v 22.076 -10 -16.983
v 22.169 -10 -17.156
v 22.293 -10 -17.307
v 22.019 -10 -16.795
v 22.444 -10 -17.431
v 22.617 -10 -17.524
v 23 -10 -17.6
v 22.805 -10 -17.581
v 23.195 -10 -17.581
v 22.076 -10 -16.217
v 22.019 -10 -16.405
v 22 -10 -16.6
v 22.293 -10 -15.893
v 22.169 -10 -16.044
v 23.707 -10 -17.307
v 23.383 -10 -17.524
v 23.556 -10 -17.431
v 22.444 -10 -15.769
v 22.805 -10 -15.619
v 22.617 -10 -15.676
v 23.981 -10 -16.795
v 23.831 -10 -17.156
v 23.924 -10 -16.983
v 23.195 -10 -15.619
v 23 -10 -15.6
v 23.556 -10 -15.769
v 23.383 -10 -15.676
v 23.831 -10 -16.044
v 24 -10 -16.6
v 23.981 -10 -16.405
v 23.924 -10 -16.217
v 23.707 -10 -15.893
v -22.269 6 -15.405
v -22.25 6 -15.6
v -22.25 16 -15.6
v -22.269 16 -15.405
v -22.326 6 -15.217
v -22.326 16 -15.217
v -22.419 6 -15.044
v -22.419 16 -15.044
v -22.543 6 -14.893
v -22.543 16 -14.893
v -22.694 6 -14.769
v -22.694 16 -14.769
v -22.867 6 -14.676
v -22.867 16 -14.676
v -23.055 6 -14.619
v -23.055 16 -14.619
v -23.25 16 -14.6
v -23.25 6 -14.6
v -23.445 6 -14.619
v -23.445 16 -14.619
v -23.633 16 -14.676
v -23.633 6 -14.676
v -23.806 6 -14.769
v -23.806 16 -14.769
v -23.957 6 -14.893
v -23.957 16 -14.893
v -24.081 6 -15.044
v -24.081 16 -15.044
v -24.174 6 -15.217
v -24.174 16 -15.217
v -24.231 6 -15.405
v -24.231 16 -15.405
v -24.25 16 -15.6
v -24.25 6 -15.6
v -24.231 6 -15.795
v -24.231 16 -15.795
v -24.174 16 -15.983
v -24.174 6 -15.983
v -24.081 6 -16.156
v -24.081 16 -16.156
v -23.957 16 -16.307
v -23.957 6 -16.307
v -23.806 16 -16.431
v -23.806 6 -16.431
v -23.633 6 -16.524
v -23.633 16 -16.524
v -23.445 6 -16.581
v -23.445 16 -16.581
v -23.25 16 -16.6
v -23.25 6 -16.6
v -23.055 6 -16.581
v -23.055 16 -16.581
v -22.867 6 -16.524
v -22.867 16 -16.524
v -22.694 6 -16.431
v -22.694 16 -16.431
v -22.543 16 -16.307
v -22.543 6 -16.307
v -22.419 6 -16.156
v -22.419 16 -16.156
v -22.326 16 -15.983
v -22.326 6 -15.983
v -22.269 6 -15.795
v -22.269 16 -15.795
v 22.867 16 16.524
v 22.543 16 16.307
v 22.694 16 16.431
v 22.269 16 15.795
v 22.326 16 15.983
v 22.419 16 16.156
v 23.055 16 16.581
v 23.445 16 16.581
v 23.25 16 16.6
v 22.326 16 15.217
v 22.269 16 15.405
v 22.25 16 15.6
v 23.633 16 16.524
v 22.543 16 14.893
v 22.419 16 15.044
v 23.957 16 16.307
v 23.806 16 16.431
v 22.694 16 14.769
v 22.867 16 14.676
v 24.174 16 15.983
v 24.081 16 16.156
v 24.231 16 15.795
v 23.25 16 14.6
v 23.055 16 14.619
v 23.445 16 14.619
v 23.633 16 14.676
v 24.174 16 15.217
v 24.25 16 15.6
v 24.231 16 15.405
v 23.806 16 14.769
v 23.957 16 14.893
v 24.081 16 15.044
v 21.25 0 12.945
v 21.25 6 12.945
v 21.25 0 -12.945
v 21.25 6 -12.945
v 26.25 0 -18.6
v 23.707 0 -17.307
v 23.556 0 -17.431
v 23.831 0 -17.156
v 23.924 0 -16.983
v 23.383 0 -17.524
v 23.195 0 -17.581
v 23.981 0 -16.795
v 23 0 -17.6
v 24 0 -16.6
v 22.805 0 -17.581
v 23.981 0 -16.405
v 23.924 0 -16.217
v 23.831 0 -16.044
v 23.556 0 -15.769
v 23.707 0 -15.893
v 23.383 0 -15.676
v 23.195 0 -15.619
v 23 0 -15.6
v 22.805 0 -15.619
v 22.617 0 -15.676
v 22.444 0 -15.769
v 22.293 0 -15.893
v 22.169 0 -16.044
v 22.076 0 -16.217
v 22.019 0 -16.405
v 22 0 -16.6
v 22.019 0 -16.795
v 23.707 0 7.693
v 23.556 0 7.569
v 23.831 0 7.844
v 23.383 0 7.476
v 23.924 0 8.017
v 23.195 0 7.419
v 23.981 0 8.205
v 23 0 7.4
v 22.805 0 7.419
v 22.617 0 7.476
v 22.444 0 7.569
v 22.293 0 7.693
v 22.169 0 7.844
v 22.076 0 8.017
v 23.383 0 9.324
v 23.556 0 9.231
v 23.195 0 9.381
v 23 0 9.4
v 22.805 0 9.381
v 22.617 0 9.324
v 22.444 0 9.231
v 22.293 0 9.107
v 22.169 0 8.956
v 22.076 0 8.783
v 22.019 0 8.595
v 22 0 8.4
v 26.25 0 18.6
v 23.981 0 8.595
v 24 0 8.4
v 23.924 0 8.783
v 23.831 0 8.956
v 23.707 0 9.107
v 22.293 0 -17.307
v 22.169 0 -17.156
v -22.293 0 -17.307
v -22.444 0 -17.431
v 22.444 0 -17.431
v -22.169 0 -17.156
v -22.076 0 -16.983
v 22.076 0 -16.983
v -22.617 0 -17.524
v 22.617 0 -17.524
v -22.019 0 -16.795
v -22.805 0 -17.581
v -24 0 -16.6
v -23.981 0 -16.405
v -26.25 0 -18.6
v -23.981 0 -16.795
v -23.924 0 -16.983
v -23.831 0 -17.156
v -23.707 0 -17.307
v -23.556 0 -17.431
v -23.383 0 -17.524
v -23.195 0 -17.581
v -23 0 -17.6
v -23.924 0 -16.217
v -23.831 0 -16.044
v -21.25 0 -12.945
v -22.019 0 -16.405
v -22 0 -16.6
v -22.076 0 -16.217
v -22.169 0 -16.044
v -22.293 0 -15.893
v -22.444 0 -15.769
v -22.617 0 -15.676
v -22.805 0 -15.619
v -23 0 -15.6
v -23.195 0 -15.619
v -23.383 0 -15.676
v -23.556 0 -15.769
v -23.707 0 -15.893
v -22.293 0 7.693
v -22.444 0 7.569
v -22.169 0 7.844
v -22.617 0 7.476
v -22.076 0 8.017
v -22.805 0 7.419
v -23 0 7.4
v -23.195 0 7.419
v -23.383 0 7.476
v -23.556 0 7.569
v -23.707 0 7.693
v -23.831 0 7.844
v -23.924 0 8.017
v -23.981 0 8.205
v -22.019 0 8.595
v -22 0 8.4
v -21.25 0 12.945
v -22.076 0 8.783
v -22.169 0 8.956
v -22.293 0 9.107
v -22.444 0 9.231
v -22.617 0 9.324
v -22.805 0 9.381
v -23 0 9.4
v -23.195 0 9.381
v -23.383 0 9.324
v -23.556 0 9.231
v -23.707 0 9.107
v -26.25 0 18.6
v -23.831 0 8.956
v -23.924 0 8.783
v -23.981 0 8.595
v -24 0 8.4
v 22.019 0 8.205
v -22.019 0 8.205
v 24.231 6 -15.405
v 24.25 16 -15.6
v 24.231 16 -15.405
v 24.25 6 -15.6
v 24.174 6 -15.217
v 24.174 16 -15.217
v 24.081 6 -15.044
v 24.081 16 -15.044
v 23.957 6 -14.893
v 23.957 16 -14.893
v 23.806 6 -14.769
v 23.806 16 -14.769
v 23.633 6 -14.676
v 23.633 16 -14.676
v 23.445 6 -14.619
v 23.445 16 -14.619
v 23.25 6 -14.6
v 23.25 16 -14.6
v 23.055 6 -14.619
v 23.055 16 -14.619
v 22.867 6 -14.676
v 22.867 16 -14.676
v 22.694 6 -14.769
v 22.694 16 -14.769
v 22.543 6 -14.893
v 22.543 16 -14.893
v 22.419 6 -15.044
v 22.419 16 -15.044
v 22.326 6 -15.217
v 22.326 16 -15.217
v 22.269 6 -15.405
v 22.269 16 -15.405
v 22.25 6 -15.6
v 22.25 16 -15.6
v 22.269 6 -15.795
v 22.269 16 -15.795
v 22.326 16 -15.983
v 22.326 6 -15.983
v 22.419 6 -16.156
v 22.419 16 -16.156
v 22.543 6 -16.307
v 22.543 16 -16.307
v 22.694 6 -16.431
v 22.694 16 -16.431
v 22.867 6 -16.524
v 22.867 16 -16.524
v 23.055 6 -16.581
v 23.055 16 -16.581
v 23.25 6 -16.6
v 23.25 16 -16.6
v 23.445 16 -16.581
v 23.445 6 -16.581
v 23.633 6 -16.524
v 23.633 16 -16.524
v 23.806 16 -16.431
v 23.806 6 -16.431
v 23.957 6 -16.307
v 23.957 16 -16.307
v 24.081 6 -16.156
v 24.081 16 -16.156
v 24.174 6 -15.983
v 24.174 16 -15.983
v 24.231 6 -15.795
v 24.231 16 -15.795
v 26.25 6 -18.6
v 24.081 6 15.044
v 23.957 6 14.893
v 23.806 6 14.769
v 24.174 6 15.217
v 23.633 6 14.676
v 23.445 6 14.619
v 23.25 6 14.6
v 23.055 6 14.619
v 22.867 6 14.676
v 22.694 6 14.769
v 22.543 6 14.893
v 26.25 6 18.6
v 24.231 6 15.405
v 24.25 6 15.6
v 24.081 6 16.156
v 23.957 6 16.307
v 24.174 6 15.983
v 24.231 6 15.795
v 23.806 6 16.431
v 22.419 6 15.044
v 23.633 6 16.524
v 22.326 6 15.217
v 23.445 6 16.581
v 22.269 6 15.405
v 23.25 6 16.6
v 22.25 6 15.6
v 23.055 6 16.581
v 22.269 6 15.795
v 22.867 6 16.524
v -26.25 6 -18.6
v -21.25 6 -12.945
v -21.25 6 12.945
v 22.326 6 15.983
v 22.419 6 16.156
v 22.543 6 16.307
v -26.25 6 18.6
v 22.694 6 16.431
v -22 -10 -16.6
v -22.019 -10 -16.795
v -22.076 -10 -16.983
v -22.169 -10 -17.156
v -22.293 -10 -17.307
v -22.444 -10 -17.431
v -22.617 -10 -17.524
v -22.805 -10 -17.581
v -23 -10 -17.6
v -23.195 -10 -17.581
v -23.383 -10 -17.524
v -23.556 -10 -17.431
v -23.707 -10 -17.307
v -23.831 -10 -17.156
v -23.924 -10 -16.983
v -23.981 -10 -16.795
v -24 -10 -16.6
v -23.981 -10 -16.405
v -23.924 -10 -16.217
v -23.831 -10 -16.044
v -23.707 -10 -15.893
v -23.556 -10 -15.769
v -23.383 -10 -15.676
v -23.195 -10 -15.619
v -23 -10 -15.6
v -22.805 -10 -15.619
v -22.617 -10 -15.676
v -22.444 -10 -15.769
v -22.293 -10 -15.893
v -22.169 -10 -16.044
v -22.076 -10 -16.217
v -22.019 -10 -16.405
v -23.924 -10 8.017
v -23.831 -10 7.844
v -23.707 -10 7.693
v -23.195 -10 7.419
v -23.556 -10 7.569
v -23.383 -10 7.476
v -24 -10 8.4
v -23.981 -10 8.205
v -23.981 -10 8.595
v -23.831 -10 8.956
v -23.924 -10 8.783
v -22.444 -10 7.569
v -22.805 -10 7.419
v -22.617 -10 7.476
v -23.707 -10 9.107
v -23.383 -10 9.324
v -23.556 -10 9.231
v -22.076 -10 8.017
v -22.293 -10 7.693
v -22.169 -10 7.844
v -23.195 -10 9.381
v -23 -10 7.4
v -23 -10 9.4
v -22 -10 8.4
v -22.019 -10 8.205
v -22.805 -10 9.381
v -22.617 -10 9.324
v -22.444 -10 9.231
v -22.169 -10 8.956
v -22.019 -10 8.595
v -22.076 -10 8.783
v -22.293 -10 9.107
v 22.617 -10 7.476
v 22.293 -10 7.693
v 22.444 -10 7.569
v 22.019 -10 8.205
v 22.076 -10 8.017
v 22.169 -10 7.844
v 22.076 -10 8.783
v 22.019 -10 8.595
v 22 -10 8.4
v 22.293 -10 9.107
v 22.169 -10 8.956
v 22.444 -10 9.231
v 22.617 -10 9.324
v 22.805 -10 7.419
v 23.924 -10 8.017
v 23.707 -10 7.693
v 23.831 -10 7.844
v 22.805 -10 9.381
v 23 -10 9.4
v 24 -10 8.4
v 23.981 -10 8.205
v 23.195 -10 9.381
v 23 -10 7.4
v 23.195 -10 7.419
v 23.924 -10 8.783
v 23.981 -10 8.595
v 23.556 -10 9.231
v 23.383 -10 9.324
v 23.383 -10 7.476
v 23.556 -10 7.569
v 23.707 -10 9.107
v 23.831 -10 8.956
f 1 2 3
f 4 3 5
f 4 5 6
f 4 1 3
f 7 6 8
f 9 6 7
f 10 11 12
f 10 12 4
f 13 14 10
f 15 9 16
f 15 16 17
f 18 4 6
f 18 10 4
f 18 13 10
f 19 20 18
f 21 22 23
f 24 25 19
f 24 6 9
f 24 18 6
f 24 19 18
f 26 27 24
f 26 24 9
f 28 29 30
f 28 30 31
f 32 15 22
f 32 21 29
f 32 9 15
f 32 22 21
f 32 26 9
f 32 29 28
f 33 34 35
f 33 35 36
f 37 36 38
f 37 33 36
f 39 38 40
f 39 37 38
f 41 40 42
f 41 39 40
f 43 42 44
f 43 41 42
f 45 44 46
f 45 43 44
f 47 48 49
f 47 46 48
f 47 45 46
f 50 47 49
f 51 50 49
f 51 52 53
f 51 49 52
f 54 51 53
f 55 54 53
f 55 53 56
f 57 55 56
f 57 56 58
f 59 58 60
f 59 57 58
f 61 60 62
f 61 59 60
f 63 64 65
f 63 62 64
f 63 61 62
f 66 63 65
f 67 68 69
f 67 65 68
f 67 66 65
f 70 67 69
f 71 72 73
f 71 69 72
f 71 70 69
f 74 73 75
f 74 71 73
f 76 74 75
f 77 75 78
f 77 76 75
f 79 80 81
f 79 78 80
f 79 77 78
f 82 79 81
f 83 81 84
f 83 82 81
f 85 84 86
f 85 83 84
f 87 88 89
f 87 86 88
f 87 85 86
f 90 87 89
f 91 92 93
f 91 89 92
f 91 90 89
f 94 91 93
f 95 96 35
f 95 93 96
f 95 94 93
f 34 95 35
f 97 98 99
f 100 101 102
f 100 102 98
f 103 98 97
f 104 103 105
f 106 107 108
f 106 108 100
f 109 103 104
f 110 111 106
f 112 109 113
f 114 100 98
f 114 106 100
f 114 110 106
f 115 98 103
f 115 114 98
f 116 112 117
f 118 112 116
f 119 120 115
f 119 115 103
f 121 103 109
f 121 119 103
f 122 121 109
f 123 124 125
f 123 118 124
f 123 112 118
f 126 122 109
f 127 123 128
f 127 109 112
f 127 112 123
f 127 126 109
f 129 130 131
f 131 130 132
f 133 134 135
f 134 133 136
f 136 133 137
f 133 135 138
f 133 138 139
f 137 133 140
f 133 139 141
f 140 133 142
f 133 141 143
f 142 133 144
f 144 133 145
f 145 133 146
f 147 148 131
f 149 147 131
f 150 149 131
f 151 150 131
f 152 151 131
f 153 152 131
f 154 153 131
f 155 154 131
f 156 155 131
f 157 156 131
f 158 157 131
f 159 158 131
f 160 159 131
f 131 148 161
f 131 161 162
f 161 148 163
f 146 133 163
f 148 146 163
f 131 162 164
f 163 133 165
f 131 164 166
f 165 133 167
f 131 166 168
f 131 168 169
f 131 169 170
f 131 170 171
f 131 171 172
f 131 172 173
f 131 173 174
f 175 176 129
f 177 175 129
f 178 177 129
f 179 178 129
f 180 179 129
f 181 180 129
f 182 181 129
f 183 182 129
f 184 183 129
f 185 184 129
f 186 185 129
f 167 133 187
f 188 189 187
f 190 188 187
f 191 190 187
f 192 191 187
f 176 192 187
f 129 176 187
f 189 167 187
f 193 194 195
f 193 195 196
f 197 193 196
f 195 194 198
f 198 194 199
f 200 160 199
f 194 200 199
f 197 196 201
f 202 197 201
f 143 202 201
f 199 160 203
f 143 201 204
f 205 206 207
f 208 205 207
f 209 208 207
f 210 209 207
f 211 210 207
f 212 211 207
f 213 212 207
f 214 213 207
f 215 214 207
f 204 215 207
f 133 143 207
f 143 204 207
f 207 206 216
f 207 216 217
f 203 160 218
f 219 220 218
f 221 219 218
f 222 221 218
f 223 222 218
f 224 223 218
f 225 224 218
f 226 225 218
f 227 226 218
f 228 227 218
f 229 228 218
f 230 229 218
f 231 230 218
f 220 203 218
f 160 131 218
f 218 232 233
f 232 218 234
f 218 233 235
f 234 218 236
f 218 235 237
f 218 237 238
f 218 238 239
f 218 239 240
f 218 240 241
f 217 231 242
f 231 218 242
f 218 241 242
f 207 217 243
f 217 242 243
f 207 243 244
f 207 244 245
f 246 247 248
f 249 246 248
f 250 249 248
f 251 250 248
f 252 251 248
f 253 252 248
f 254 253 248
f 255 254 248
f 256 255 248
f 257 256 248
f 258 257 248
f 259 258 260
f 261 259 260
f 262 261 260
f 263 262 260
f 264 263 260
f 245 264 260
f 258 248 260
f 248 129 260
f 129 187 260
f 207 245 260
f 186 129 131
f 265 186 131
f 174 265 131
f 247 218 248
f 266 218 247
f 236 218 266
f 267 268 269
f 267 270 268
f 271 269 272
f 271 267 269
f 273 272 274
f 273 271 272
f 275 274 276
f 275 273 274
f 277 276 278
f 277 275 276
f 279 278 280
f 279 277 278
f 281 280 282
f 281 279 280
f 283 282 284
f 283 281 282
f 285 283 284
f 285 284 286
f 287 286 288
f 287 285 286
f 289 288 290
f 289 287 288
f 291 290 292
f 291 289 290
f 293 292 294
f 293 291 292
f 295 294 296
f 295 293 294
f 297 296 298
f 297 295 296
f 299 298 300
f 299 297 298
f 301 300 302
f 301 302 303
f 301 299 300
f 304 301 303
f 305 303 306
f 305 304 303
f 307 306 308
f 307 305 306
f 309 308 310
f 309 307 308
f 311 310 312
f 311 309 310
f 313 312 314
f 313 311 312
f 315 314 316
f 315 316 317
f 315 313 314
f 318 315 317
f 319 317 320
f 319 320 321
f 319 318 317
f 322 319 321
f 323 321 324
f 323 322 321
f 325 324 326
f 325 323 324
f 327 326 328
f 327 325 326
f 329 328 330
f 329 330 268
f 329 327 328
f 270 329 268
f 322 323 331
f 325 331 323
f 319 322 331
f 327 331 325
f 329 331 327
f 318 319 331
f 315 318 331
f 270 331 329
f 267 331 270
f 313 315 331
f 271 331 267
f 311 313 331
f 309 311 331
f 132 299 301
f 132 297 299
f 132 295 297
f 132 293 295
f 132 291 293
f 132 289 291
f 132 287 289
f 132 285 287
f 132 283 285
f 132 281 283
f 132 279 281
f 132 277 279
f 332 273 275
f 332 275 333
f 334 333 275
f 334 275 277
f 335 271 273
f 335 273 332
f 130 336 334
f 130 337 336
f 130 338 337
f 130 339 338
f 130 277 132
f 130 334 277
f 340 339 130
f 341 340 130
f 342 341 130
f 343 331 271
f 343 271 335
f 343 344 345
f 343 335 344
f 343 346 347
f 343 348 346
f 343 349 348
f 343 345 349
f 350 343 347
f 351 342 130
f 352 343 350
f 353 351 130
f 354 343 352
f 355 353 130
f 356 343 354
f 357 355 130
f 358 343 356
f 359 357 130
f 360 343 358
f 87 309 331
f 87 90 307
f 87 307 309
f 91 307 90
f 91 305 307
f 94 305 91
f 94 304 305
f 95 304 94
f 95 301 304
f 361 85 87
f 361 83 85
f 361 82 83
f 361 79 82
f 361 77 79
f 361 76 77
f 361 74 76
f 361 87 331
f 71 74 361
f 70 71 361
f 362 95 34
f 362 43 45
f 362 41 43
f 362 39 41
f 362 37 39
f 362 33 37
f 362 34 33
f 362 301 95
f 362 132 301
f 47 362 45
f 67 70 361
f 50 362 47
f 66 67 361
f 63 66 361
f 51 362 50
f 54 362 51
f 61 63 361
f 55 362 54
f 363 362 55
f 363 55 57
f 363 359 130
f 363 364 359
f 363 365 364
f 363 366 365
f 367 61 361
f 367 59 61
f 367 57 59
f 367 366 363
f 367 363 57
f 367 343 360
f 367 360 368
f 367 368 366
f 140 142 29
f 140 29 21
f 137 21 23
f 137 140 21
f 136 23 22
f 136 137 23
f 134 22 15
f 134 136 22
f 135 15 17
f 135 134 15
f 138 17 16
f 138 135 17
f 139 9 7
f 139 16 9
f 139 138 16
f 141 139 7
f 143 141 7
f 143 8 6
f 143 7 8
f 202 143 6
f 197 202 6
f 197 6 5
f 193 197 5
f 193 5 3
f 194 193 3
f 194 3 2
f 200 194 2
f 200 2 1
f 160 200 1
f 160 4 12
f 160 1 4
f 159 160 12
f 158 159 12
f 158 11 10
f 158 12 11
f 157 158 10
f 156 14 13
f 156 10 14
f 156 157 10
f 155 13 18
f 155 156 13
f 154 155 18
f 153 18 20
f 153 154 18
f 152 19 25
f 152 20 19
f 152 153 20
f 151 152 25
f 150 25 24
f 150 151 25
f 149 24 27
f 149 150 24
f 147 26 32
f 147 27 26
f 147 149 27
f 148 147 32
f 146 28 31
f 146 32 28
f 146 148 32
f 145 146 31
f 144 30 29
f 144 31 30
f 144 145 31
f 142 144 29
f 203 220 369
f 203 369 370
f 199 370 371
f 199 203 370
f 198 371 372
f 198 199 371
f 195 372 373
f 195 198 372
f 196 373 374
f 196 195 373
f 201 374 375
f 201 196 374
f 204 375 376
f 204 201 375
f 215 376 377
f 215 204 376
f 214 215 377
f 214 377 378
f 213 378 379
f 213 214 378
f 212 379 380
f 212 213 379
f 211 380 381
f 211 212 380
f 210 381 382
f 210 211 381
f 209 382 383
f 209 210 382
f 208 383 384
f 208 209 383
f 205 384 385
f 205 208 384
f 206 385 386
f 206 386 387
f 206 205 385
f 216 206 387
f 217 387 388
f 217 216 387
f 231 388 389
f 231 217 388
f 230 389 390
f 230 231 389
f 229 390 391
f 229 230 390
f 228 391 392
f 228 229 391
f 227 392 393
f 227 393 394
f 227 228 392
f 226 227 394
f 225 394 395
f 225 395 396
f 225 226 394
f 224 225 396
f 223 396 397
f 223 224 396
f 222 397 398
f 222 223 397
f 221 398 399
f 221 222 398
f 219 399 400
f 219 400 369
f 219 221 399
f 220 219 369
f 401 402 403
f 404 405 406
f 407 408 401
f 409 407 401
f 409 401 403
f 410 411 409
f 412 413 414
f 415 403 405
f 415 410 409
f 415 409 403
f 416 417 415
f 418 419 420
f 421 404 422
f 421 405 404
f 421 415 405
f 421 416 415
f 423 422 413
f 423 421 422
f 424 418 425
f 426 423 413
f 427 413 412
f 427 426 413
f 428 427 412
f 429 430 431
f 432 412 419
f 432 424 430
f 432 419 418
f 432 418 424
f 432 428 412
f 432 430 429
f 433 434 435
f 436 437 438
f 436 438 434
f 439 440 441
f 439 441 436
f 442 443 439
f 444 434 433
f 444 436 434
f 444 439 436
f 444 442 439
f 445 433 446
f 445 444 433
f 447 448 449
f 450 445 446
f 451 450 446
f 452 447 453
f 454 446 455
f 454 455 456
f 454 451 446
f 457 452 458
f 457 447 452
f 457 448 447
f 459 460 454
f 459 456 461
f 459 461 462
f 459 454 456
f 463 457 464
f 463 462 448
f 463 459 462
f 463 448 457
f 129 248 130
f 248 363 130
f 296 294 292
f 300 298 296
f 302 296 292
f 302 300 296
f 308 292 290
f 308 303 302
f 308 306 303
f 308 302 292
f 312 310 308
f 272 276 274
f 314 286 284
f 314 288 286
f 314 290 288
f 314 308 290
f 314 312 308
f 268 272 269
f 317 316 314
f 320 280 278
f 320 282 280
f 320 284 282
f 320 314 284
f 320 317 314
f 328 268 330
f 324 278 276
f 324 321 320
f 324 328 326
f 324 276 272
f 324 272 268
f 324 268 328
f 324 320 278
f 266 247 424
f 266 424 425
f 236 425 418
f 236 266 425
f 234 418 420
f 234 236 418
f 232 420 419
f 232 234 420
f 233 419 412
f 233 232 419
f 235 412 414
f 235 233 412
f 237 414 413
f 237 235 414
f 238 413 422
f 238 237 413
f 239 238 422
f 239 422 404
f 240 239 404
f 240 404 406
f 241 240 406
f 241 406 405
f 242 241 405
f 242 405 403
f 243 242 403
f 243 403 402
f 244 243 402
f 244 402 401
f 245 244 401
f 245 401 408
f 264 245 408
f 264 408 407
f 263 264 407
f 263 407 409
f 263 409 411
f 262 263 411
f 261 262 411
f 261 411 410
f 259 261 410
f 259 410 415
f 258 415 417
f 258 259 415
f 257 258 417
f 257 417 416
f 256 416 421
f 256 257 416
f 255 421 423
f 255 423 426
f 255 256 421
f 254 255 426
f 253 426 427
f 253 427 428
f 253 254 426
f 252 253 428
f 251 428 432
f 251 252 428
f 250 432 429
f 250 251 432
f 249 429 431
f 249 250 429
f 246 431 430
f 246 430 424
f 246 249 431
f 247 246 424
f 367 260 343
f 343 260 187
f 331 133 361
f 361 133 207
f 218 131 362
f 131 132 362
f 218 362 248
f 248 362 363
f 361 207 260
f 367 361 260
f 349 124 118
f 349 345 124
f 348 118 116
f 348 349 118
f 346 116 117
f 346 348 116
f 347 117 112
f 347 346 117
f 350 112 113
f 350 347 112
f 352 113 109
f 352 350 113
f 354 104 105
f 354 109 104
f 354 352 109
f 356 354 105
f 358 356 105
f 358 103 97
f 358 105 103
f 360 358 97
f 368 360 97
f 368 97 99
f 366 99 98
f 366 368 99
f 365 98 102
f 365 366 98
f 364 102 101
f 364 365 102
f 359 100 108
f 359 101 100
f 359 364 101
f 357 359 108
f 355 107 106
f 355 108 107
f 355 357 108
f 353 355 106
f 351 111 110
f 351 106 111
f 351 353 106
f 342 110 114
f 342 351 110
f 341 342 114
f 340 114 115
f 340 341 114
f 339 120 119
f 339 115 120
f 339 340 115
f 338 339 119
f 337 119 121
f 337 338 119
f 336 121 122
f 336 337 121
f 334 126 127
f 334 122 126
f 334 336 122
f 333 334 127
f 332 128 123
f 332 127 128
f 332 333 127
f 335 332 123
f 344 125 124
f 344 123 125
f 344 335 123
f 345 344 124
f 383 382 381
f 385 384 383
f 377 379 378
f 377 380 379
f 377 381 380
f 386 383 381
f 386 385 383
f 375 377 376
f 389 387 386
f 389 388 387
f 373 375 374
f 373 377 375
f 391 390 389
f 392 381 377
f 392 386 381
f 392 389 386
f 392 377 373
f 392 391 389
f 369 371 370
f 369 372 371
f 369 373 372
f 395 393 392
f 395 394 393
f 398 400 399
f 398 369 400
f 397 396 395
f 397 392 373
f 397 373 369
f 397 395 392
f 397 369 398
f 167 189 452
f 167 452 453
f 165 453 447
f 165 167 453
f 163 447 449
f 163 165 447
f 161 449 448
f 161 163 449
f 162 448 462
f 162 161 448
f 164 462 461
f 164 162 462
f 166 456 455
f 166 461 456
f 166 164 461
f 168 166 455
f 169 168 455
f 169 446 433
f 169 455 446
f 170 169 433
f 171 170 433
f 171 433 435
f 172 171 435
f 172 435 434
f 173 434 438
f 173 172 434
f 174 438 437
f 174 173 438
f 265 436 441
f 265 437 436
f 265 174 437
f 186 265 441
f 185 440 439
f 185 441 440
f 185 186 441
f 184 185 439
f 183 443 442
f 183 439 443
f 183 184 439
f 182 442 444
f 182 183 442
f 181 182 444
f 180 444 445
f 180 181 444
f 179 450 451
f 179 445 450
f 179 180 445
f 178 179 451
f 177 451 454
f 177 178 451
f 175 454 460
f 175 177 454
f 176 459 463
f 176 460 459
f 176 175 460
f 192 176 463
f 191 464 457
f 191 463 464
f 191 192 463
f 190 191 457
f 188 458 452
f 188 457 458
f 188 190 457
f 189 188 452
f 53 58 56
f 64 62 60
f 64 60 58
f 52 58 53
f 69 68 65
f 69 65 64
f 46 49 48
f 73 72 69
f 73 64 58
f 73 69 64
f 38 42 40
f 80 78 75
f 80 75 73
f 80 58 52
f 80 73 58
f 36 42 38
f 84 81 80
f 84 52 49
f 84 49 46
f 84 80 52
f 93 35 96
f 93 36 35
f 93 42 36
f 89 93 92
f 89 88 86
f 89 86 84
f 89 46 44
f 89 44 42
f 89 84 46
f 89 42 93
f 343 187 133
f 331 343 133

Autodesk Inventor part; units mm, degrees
ref_plane "YZ Plane" through (0, 0, 0) normal (1, 0, 0) x (0, 1, 0)
ref_plane "XZ Plane" through (0, 0, 0) normal (0, 1, 0) x (-1, 0, 0)
ref_plane "XY Plane" through (0, 0, 0) normal (0, 0, 1) x (1, 0, 0)
sketch "Sketch1" plane through (0, 0, 0) normal (0, 1, 0) x (-1, 0, 0)
  line L0 (26.25, 18.6) -> (-26.25, 18.6)
  line L1 (-26.25, 18.6) -> (-26.25, -18.6)
  line L2 (-26.25, -18.6) -> (26.25, -18.6)
  line L3 (26.25, -18.6) -> (26.25, 18.6)
  line L4 (26.25, 18.6) -> (-26.25, -18.6) construction
  line L5 (-26.25, 18.6) -> (26.25, -18.6) construction
  line L6 (-26.25, -18.6) -> (-23.25, -18.6)
  point P0 (0, 0)
  dimension "d0" = 52.5
  dimension "d1" = 37.2
  dimension "d2" = 3
extrude "Extrusion1" add sketch "Sketch1" along normal blind 6
sketch "Sketch2" plane through (0, 6, 0) normal (0, 1, 0) x (1, 0, 0)
  line L0 (26.25, 18.6) -> (-26.25, 18.6) projected
  line L1 (26.25, 18.6) -> (26.25, 15.6)
  line L2 (26.25, -18.6) -> (26.25, 18.6) projected
  line L3 (26.25, 18.6) -> (23.25, 18.6)
  line L4 (23.25, 18.6) -> (23.25, 15.6)
  circle A0 centre (23.25, 15.6) radius 1
  line L5 (26.25, 0) -> (18.0402, 0)
  line L6 (0, 18.6) -> (0, 10.2391)
  circle A1 centre (23.25, -15.6) radius 1
  circle A2 centre (-23.25, 15.6) radius 1
  point P0 (0, 0)
  dimension "d5" = 3
  dimension "d6" = 3
  dimension "d7" = 2
extrude "Extrusion2" add sketch "Sketch2" along normal blind 10
sketch "Sketch4" plane through (0, 0, 0) normal (0, -1, 0) x (1, 0, 0)
  line L0 (26.25, -18.6) -> (-26.25, -18.6) projected
  line L1 (-26.25, -18.6) -> (-26.25, -16.6)
  line L2 (-26.25, -18.6) -> (-26.25, 18.6) projected
  line L3 (-26.25, -16.6) -> (-23, -16.6)
  circle A0 centre (-23, -16.6) radius 1
  line L4 (-23, -16.6) -> (-23, 8.4)
  line L5 (-23, -4.1) -> (-16.8136, -4.1)
  circle A1 centre (-23, 8.4) radius 1
  line L6 (0, -18.6) -> (0, -14.1147)
  circle A2 centre (23, -16.6) radius 1
  circle A3 centre (23, 8.4) radius 1
  point P0 (0, 0)
  dimension "d16" = 2
  dimension "d17" = 3.25
  dimension "d18" = 2
  dimension "d19" = 25
extrude "Extrusion4" add sketch "Sketch4" along normal blind 10
sketch "Sketch5" plane through (0, 6, 0) normal (0, 1, 0) x (1, 0, 0)
  line L0 (-21.2504, -12.9448) -> (21.2504, -12.9448)
  line L1 (21.2504, -12.9448) -> (21.2504, 12.9448)
  line L2 (21.2504, 12.9448) -> (-21.2504, 12.9448)
  line L3 (-21.2504, 12.9448) -> (-21.2504, -12.9448)
  line L4 (-21.2504, -12.9448) -> (21.2504, 12.9448) construction
  line L5 (21.2504, -12.9448) -> (-21.2504, 12.9448) construction
  point P0 (0, 0)
extrude "Extrusion5" cut sketch "Sketch5" against normal blind 10.5
properties part number "Divider_NodeMCU_Sipeed"
